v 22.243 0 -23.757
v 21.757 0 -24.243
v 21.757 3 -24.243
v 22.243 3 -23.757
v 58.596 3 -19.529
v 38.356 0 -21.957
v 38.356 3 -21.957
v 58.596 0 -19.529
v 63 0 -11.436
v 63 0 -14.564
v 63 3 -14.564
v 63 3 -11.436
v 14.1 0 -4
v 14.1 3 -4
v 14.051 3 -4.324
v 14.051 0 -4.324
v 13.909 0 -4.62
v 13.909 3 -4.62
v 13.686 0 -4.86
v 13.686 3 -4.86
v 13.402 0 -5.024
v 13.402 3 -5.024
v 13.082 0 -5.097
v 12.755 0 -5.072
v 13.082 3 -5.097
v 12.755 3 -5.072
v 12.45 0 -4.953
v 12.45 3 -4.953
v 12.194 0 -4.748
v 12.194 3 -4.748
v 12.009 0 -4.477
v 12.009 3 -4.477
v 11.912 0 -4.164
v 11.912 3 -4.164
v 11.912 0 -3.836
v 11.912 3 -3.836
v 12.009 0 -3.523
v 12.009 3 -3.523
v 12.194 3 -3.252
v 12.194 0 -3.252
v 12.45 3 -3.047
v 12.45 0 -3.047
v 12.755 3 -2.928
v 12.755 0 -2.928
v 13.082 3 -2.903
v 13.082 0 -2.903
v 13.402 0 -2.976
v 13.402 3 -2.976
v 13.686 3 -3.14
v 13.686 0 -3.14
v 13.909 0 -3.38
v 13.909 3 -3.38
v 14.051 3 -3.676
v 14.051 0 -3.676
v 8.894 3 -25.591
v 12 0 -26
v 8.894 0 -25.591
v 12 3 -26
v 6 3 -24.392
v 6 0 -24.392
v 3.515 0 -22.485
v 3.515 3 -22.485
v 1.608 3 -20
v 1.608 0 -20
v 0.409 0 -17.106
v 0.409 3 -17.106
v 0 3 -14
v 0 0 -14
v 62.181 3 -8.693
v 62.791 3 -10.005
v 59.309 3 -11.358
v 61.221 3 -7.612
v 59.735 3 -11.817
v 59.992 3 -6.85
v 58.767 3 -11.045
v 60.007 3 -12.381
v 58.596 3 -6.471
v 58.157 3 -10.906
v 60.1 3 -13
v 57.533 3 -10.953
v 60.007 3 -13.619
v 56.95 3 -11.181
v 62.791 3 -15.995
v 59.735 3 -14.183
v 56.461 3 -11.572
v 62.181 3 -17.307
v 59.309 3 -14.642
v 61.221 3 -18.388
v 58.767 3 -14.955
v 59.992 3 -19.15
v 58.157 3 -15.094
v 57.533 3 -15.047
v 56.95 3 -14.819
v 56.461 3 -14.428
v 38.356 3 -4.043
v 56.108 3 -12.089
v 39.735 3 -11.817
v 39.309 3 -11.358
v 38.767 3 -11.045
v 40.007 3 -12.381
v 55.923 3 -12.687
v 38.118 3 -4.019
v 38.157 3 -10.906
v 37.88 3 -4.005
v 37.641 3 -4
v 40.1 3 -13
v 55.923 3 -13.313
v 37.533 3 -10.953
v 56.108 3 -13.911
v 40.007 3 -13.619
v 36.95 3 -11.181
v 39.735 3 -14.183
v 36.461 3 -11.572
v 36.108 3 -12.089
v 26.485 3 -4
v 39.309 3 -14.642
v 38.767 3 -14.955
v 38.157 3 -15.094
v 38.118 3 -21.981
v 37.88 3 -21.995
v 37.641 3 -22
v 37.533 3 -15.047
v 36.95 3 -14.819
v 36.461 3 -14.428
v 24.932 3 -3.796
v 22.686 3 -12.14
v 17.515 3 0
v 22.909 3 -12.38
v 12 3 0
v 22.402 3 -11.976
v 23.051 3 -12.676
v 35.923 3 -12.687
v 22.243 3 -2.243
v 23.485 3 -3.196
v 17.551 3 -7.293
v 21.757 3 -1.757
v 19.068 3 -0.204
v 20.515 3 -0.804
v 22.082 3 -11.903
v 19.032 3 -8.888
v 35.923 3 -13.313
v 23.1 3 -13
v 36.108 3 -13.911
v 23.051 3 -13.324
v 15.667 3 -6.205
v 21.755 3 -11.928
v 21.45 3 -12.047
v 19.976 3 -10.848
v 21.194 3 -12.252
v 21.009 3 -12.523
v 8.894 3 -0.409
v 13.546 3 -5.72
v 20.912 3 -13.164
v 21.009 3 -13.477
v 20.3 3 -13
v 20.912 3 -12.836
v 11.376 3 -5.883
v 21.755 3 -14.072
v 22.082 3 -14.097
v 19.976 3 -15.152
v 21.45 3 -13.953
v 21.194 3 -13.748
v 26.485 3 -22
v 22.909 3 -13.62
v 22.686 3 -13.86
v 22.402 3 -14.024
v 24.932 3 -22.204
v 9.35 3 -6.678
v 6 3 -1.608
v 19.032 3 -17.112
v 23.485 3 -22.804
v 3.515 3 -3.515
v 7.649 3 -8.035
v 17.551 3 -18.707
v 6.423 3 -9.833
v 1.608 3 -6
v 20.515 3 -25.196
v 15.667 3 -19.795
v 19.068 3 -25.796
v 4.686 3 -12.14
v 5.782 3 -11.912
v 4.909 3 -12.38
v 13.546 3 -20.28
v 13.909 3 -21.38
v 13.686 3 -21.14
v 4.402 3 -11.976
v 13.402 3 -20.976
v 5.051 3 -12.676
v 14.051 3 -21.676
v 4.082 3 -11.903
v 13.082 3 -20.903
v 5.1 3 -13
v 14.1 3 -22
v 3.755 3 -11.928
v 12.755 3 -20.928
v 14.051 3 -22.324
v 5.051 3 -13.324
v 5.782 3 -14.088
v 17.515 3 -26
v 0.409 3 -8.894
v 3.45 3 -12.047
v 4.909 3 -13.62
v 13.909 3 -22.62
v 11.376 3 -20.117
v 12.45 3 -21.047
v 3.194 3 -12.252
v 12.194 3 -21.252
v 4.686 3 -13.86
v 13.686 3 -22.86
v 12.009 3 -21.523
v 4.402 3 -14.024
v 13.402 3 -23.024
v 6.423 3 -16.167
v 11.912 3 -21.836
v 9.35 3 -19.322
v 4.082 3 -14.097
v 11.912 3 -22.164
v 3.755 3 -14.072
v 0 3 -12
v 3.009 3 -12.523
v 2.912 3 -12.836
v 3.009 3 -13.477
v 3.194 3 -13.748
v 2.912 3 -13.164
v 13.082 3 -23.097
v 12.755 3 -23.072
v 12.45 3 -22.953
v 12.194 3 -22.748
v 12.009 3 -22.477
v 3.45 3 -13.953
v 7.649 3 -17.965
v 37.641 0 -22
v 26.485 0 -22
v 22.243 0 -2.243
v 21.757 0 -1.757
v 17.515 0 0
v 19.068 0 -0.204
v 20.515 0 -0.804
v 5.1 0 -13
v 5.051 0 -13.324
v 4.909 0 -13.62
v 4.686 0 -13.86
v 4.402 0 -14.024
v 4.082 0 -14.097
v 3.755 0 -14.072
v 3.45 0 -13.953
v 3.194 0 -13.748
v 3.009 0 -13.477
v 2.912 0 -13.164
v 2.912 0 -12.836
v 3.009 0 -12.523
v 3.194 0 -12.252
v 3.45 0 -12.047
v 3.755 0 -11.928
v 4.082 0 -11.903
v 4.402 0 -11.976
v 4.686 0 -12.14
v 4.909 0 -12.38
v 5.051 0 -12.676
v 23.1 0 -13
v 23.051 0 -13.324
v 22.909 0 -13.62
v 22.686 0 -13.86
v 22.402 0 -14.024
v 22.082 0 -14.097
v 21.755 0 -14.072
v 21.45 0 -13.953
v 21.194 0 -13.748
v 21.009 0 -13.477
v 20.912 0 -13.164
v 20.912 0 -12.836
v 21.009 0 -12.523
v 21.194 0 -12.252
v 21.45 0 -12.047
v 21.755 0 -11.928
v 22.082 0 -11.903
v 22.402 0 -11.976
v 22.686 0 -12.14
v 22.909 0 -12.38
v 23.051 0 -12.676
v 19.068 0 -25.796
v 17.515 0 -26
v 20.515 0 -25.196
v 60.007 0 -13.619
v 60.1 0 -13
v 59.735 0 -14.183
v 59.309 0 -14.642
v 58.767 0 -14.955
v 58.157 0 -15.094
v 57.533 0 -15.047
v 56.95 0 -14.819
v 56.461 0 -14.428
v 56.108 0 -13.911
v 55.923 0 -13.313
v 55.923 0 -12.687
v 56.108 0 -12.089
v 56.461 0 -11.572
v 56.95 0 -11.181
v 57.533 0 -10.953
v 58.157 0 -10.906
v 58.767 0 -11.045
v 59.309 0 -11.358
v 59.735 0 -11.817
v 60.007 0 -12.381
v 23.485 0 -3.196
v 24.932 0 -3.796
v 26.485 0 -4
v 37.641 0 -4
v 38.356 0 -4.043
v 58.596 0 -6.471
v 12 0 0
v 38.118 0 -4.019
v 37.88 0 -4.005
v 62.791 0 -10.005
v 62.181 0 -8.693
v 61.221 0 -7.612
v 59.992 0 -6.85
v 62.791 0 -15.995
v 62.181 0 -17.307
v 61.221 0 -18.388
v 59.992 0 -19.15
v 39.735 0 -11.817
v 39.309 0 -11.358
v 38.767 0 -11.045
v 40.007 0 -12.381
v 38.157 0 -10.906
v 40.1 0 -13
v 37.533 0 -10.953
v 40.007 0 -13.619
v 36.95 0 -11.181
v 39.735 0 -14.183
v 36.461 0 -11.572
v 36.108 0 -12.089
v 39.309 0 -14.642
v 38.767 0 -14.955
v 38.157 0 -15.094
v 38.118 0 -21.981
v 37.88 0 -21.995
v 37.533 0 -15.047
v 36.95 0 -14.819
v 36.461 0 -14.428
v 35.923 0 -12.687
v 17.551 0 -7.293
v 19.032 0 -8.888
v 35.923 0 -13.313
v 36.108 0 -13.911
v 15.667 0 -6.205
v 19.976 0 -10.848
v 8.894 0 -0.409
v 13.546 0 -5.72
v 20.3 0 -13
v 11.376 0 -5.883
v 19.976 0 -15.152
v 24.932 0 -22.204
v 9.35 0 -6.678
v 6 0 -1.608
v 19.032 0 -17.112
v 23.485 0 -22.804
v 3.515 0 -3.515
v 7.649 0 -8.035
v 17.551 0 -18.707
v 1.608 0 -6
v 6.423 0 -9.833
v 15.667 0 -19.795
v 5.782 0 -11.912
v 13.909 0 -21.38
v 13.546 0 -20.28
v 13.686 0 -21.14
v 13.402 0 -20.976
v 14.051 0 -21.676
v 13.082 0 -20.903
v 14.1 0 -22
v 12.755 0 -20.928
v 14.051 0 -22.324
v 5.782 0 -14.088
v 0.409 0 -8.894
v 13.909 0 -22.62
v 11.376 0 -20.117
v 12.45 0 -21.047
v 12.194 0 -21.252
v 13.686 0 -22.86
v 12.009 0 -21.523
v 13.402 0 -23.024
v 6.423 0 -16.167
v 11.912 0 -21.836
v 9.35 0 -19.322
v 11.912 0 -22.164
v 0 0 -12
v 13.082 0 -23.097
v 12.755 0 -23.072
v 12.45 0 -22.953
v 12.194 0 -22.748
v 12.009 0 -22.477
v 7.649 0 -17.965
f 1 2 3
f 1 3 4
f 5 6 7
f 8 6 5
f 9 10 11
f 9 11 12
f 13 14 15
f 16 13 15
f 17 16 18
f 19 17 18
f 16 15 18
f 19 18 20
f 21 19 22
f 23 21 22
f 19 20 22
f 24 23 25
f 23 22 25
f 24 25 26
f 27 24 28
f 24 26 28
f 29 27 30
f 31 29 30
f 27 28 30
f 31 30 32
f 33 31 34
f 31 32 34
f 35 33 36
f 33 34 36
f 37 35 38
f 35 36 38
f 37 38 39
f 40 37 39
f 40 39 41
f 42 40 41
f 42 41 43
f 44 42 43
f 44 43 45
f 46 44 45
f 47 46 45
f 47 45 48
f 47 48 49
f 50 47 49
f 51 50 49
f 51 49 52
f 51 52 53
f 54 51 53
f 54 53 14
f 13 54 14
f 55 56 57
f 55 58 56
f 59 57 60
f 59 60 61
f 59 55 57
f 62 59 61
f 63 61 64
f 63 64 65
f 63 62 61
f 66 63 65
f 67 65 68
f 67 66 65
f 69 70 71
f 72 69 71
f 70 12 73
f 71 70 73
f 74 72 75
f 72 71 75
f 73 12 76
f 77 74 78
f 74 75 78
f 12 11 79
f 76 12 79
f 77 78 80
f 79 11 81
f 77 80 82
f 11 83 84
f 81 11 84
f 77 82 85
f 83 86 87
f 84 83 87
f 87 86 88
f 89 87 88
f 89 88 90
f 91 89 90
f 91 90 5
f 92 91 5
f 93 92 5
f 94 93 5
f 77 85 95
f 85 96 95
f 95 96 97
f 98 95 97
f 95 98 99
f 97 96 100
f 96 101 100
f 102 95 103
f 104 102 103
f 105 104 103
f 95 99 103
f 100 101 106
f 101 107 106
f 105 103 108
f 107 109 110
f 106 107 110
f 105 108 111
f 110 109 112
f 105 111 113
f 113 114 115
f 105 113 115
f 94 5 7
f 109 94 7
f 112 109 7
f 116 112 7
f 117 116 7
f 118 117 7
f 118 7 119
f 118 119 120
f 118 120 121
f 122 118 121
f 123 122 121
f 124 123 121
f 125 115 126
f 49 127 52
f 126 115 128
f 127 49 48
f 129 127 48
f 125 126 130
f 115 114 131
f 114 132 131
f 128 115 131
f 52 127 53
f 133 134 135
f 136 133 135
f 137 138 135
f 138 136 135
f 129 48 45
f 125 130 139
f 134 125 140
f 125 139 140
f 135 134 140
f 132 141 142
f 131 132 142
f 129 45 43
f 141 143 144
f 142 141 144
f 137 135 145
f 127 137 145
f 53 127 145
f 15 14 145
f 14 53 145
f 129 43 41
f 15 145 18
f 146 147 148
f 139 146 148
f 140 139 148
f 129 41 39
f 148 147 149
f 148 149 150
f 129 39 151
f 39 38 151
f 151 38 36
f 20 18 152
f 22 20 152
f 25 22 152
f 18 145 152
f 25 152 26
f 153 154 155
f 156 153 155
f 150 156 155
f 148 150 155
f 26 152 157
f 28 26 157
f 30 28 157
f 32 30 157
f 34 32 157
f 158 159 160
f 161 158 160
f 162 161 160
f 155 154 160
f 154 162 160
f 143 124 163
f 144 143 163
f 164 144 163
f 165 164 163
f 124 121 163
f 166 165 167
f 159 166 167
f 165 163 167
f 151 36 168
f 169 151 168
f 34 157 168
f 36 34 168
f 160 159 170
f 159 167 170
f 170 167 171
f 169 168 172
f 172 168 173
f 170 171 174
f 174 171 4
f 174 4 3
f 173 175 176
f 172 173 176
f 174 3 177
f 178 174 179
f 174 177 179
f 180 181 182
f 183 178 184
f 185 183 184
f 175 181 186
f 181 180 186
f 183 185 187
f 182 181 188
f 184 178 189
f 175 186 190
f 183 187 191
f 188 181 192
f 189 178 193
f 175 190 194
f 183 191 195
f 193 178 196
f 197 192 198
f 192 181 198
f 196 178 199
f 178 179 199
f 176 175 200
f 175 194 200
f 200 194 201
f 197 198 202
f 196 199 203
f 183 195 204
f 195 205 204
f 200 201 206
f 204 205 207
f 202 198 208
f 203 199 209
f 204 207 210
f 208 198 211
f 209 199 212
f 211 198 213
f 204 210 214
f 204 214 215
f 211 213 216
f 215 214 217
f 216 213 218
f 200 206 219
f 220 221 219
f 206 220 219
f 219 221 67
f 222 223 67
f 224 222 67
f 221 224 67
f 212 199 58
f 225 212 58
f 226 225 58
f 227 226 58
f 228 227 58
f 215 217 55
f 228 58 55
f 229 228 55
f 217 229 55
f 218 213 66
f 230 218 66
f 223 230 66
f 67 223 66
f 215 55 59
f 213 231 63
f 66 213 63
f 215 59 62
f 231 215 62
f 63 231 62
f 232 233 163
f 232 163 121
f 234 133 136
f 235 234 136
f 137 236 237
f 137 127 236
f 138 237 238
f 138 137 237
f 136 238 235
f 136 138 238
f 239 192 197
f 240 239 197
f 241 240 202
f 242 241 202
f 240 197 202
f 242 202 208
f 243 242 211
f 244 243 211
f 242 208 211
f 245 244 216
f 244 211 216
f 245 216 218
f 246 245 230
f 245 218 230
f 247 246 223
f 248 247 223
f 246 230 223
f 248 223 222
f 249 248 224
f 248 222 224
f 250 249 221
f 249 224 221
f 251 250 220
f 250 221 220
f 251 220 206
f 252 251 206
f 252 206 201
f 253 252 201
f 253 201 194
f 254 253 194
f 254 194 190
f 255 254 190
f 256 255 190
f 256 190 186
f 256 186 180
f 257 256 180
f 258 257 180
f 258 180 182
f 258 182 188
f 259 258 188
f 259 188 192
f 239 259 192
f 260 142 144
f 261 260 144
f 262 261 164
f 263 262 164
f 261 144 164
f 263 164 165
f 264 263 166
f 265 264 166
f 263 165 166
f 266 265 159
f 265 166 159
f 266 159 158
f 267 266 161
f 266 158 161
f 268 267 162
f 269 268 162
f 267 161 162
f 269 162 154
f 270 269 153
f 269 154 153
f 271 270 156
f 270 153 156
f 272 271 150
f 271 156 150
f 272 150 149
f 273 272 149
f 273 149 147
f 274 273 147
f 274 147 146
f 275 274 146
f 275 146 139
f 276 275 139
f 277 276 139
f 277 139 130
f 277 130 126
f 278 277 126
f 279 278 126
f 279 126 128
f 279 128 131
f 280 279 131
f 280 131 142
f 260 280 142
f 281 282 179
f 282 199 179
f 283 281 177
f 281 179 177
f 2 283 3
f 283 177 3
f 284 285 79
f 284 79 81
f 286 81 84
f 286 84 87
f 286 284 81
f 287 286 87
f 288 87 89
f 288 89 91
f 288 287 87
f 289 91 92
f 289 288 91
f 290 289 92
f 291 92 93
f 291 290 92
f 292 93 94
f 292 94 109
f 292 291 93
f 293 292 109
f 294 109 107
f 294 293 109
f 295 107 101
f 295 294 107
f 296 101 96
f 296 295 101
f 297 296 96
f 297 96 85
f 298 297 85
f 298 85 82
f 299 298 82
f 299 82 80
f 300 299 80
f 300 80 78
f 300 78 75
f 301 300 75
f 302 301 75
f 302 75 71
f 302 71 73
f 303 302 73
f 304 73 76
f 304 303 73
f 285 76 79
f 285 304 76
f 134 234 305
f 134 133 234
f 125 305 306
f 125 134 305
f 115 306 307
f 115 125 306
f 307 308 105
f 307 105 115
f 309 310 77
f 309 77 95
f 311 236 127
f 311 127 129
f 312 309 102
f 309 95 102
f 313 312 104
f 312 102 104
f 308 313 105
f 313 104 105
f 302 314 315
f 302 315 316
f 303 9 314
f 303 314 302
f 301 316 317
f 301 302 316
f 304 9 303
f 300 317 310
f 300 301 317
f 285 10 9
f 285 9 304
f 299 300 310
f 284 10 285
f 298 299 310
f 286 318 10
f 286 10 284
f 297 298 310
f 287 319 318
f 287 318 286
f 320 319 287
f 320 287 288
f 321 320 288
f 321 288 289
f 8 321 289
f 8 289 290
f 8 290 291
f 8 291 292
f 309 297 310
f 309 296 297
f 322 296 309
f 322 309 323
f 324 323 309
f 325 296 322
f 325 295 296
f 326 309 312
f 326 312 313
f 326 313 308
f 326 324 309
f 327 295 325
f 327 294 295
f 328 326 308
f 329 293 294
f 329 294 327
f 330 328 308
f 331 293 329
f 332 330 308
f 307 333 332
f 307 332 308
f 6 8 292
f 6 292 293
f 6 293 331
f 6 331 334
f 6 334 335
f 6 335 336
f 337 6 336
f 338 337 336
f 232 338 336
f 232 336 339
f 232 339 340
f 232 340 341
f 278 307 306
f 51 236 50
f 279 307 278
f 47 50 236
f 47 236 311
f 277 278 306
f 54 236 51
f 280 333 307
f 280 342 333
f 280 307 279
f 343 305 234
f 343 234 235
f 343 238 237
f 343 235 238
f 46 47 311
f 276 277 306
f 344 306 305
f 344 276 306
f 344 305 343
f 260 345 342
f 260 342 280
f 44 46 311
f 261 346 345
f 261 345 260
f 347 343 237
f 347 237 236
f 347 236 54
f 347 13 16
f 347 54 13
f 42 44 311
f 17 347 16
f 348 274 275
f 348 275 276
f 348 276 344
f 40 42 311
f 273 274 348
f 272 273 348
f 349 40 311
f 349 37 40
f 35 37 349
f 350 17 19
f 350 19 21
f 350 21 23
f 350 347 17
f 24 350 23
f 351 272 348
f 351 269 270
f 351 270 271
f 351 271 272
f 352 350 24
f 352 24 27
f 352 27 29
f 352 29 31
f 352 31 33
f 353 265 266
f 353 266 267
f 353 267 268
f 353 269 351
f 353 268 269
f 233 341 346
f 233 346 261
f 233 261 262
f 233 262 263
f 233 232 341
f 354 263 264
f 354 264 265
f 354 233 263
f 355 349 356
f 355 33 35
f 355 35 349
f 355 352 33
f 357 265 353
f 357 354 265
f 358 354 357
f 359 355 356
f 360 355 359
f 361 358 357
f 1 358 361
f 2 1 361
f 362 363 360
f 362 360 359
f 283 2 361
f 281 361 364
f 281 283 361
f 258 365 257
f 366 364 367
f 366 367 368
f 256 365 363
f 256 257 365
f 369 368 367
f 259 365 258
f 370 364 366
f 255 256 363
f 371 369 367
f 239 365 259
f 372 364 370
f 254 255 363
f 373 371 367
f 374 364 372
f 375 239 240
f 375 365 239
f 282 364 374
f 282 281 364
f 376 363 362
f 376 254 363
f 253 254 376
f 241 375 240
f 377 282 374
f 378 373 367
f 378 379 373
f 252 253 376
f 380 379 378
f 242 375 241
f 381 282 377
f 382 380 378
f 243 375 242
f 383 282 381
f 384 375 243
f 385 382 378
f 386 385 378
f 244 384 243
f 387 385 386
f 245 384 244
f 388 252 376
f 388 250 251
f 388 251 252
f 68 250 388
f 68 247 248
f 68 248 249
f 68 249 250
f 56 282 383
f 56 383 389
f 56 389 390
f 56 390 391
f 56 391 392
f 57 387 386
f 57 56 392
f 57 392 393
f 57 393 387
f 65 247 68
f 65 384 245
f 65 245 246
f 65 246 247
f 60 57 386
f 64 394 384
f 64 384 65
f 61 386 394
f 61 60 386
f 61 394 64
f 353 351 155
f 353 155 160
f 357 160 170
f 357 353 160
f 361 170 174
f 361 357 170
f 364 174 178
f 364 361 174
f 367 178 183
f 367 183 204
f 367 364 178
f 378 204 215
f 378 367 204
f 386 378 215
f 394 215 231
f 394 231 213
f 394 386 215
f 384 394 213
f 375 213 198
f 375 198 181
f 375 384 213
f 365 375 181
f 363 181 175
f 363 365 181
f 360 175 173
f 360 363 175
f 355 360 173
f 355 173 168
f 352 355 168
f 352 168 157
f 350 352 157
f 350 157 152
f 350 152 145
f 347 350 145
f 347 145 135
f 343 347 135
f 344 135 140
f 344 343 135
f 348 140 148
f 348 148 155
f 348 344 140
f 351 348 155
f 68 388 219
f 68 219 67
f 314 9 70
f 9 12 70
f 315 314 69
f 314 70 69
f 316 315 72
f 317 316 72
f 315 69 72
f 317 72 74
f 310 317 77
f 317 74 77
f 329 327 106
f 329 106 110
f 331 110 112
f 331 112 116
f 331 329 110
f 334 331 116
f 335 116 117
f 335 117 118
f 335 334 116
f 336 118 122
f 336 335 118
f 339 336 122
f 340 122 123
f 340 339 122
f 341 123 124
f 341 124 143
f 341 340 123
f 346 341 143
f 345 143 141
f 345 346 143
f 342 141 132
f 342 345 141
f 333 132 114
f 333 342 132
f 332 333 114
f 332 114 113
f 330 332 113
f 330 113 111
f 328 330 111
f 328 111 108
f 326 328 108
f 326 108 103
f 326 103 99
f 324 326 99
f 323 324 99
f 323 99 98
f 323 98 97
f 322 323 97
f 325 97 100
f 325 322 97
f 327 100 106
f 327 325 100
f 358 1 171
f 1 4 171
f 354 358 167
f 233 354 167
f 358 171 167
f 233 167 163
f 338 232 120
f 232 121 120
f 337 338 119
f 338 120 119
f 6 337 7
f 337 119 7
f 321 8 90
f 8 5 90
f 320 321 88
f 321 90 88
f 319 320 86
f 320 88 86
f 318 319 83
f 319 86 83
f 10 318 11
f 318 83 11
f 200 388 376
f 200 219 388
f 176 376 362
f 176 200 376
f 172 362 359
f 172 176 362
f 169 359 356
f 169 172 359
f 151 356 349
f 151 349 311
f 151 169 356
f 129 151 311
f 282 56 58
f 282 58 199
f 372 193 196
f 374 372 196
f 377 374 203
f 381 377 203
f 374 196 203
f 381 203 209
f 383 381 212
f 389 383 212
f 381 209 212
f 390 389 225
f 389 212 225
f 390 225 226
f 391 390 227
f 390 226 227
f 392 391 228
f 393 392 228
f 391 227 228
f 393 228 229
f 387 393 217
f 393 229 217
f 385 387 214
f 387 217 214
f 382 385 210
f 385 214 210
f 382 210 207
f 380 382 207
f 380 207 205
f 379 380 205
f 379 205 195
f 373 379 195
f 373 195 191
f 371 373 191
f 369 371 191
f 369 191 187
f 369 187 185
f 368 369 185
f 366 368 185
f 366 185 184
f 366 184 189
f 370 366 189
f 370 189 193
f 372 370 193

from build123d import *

# Parameters (mm, degrees)
SKETCH1_R           = 7.3
SKETCH1_R_2         = 2.1
BOSS_EXTRUDE1_DEPTH = 3
FILLET1_R           = 12
FILLET4_R           = 6
FILLET5_R           = 5
SKETCH2_R           = 1.1
CUT_EXTRUDE1_DEPTH  = 10


with BuildPart() as part:
    # Sketch1 → Boss-Extrude1 (new body)
    with BuildSketch(Plane(origin=(0, 0, 0), x_dir=(1, 0, 0), z_dir=(0, 1, 0))):
        Polygon((20, 26), (24, 22), (38, 22), (63, 19), (63, 7), (38, 4), (24, 4), (20, 0), (0, 0), (0, 26), align=None)
        with Locations((13, 13)):
            Circle(SKETCH1_R, mode=Mode.SUBTRACT)
        with Locations((38, 13)):
            Circle(SKETCH1_R_2, mode=Mode.SUBTRACT)
        with Locations((58, 13)):
            Circle(SKETCH1_R_2, mode=Mode.SUBTRACT)
    extrude(amount=BOSS_EXTRUDE1_DEPTH)

    # Fillet1
    fillet1_edges = [part.edges().sort_by_distance(p)[0] for p in [
        (0, 1.5, 0),
        (0, 1.5, -26),
    ]]
    fillet(fillet1_edges, radius=FILLET1_R)

    # Fillet4
    fillet4_edges = [part.edges().sort_by_distance(p)[0] for p in [
        (20, 1.5, -26),
        (24, 1.5, -22),
        (38, 1.5, -22),
        (38, 1.5, -4),
        (24, 1.5, -4),
        (20, 1.5, 0),
    ]]
    fillet(fillet4_edges, radius=FILLET4_R)

    # Fillet5
    fillet5_edges = [part.edges().sort_by_distance(p)[0] for p in [
        (63, 1.5, -19),
        (63, 1.5, -7),
    ]]
    fillet(fillet5_edges, radius=FILLET5_R)

    # Sketch2 → Cut-Extrude1 (cut)
    with BuildSketch(Plane(origin=(0, 3, 0), x_dir=(1, 0, 0), z_dir=(0, 1, 0))):
        with Locations((22, 13)):
            Circle(SKETCH2_R)
        with Locations((13, 4)):
            Circle(SKETCH2_R)
        with Locations((4, 13)):
            Circle(SKETCH2_R)
        with Locations((13, 22)):
            Circle(SKETCH2_R)
    extrude(amount=-CUT_EXTRUDE1_DEPTH, mode=Mode.SUBTRACT)


solid = part.part
